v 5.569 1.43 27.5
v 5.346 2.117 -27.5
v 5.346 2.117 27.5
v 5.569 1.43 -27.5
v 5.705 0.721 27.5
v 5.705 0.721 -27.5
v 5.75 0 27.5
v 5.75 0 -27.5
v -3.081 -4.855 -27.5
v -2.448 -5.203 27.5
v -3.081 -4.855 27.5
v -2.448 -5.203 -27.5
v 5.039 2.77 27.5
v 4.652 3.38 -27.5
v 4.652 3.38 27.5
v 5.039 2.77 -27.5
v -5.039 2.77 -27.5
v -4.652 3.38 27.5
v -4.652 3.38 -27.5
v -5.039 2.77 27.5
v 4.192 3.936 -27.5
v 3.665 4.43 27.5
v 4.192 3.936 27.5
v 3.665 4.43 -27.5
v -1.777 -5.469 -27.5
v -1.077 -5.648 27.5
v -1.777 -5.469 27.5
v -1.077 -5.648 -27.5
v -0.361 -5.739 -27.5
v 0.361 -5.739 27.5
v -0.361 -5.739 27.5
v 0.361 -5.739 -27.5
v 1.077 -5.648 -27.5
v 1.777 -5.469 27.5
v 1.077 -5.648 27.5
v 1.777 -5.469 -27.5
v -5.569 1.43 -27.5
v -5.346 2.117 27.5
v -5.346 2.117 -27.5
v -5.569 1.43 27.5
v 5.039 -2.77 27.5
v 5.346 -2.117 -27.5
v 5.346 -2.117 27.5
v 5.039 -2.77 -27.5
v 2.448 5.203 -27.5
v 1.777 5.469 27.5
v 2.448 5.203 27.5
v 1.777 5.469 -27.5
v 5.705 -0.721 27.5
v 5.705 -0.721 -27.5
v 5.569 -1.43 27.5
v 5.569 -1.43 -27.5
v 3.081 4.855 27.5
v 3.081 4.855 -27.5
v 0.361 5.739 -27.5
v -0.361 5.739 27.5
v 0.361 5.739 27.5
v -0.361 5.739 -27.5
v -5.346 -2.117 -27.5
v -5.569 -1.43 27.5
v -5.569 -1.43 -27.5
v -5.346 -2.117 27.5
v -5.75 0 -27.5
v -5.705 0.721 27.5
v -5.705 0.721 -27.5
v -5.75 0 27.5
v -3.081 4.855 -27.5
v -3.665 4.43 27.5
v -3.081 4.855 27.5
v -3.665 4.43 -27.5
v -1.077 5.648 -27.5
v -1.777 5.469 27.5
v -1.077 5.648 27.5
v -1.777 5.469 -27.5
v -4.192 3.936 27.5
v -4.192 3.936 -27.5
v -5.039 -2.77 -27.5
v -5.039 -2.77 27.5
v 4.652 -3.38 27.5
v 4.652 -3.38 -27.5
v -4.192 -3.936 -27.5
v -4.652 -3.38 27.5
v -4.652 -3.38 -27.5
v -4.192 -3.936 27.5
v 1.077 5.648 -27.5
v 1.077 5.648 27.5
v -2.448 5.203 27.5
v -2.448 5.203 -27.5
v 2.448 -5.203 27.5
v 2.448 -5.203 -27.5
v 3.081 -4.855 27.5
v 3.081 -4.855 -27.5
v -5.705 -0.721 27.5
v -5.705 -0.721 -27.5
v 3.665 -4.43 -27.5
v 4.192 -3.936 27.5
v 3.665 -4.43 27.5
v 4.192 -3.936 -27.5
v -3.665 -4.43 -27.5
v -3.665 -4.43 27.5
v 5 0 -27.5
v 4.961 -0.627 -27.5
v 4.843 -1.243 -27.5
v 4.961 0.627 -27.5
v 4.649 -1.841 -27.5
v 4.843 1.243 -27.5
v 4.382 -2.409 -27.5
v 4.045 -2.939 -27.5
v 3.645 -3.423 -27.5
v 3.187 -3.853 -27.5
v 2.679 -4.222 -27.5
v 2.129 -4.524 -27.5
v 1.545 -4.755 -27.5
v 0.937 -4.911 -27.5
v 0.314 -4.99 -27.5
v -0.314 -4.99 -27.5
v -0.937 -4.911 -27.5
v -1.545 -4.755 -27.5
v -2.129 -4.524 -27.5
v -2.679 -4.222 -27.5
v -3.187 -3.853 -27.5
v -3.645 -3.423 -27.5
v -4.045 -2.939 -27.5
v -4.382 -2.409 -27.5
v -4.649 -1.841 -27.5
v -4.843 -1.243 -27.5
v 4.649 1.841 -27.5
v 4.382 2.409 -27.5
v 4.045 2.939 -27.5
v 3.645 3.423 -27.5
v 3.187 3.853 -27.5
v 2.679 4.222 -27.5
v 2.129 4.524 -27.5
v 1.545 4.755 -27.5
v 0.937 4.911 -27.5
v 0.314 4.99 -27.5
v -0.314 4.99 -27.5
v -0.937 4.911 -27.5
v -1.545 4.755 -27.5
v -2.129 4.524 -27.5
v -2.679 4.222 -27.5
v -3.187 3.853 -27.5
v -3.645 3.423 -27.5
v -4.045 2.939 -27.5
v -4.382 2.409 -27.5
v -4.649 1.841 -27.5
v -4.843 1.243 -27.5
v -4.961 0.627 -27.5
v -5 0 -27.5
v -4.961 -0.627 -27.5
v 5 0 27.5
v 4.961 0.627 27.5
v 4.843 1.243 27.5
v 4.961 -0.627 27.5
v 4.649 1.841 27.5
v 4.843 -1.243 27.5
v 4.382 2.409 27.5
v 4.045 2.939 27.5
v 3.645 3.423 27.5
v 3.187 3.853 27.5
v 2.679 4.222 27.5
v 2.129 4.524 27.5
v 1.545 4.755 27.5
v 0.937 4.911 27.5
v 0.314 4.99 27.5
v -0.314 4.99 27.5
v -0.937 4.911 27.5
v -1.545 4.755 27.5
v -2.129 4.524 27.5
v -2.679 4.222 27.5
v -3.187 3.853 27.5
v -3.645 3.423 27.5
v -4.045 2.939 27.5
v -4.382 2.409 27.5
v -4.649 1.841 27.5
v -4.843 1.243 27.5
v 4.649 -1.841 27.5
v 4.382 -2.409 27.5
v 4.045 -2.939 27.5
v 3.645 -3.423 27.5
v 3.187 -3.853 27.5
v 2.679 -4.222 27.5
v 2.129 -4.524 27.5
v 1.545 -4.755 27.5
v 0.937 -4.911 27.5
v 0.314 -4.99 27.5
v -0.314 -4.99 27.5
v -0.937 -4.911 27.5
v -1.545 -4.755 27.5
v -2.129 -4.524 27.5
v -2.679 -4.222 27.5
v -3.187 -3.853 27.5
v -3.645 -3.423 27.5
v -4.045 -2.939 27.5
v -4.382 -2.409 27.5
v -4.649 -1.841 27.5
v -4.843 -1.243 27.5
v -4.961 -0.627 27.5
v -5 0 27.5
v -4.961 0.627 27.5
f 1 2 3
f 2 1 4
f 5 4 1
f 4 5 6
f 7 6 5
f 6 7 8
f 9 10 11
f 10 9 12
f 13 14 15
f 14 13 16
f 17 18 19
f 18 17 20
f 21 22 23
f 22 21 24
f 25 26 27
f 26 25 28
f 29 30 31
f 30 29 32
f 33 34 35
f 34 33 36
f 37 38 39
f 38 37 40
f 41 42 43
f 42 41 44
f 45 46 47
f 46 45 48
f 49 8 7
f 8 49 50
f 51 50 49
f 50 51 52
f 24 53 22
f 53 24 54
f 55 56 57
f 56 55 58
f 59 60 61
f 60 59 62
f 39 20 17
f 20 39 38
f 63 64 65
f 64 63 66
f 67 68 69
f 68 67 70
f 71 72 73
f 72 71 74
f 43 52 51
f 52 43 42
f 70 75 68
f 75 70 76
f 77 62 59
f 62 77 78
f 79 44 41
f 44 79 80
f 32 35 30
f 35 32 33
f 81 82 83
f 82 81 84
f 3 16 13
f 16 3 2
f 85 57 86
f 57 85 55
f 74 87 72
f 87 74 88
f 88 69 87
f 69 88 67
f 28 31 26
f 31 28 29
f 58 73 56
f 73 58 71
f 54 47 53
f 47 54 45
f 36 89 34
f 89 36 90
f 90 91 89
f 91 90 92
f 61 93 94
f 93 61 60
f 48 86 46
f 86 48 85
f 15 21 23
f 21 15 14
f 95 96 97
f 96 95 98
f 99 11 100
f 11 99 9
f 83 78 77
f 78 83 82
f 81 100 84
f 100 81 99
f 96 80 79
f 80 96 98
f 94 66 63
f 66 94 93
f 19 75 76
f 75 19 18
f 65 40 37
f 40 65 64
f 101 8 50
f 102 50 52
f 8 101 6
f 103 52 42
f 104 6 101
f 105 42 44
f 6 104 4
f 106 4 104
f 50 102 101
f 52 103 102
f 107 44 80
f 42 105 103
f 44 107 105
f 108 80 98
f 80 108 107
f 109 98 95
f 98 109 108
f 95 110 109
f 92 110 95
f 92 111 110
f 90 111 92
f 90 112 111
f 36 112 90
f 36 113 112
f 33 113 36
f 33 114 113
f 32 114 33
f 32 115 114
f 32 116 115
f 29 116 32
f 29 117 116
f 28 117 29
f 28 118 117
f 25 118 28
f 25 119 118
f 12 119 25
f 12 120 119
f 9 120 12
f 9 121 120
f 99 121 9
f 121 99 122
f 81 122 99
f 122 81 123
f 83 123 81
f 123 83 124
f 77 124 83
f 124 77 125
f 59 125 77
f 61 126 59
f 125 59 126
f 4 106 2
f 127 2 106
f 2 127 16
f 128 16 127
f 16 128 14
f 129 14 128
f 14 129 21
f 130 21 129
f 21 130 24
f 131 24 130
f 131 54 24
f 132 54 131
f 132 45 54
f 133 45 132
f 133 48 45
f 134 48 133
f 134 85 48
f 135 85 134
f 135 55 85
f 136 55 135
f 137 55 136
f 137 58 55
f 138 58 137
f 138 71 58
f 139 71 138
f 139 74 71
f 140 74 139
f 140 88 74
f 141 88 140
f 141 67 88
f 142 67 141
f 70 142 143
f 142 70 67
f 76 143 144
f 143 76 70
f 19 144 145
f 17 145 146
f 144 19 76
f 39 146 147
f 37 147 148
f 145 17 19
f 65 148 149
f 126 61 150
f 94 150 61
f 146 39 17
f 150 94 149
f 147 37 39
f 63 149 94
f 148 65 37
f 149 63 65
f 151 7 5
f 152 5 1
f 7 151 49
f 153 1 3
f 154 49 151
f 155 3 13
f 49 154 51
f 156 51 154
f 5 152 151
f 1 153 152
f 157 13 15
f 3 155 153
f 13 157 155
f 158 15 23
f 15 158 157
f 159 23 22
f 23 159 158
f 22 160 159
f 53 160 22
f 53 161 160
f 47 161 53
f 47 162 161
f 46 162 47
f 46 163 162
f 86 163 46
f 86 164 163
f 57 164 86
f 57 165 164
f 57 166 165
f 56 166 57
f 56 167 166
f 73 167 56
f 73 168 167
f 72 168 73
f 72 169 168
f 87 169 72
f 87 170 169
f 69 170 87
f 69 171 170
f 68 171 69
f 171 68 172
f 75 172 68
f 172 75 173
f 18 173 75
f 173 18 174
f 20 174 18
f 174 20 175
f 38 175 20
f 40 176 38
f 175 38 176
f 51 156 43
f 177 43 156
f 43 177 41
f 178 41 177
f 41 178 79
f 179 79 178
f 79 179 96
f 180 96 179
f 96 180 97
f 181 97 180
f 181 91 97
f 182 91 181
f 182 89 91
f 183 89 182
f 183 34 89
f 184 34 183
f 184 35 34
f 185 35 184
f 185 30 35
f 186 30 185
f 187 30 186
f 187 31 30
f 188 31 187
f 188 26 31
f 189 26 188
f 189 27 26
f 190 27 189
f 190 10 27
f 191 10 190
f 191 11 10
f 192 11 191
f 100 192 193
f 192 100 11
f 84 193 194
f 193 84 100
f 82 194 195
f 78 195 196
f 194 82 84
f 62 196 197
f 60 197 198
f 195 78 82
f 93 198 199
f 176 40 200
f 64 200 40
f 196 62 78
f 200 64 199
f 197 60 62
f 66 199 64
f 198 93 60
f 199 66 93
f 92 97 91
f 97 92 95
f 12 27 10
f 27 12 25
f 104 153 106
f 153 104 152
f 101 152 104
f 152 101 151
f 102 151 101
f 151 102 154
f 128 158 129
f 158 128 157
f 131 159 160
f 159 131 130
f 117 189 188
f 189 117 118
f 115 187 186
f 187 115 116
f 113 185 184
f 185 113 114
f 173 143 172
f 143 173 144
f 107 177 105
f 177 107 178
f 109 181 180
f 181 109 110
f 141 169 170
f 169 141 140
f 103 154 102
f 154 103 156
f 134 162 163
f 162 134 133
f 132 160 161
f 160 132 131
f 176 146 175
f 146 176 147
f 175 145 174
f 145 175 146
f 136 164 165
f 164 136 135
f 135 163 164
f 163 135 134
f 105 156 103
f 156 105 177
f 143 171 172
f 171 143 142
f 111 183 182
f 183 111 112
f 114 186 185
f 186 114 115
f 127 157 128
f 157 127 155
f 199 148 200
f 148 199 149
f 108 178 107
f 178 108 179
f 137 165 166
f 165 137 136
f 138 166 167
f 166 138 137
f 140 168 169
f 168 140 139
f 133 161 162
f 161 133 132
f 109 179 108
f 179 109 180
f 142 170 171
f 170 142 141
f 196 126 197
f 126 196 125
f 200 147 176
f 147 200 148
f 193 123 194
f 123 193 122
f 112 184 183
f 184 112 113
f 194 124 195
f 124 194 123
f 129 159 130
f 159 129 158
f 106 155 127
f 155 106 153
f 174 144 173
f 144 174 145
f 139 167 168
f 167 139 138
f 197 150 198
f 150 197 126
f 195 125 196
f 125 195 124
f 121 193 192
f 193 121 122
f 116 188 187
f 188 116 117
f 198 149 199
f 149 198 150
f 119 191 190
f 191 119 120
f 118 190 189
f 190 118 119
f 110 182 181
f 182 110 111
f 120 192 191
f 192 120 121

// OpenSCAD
$fn = 50;


difference() {
	union() {
		translate(v = [0, 0, -27.5000000000]) {
			cylinder(h = 55, r = 5.7500000000);
		}
	}
	union() {
		translate(v = [0, 0, -100.0000000000]) {
			cylinder(h = 200, r = 5.0000000000);
		}
	}
}
